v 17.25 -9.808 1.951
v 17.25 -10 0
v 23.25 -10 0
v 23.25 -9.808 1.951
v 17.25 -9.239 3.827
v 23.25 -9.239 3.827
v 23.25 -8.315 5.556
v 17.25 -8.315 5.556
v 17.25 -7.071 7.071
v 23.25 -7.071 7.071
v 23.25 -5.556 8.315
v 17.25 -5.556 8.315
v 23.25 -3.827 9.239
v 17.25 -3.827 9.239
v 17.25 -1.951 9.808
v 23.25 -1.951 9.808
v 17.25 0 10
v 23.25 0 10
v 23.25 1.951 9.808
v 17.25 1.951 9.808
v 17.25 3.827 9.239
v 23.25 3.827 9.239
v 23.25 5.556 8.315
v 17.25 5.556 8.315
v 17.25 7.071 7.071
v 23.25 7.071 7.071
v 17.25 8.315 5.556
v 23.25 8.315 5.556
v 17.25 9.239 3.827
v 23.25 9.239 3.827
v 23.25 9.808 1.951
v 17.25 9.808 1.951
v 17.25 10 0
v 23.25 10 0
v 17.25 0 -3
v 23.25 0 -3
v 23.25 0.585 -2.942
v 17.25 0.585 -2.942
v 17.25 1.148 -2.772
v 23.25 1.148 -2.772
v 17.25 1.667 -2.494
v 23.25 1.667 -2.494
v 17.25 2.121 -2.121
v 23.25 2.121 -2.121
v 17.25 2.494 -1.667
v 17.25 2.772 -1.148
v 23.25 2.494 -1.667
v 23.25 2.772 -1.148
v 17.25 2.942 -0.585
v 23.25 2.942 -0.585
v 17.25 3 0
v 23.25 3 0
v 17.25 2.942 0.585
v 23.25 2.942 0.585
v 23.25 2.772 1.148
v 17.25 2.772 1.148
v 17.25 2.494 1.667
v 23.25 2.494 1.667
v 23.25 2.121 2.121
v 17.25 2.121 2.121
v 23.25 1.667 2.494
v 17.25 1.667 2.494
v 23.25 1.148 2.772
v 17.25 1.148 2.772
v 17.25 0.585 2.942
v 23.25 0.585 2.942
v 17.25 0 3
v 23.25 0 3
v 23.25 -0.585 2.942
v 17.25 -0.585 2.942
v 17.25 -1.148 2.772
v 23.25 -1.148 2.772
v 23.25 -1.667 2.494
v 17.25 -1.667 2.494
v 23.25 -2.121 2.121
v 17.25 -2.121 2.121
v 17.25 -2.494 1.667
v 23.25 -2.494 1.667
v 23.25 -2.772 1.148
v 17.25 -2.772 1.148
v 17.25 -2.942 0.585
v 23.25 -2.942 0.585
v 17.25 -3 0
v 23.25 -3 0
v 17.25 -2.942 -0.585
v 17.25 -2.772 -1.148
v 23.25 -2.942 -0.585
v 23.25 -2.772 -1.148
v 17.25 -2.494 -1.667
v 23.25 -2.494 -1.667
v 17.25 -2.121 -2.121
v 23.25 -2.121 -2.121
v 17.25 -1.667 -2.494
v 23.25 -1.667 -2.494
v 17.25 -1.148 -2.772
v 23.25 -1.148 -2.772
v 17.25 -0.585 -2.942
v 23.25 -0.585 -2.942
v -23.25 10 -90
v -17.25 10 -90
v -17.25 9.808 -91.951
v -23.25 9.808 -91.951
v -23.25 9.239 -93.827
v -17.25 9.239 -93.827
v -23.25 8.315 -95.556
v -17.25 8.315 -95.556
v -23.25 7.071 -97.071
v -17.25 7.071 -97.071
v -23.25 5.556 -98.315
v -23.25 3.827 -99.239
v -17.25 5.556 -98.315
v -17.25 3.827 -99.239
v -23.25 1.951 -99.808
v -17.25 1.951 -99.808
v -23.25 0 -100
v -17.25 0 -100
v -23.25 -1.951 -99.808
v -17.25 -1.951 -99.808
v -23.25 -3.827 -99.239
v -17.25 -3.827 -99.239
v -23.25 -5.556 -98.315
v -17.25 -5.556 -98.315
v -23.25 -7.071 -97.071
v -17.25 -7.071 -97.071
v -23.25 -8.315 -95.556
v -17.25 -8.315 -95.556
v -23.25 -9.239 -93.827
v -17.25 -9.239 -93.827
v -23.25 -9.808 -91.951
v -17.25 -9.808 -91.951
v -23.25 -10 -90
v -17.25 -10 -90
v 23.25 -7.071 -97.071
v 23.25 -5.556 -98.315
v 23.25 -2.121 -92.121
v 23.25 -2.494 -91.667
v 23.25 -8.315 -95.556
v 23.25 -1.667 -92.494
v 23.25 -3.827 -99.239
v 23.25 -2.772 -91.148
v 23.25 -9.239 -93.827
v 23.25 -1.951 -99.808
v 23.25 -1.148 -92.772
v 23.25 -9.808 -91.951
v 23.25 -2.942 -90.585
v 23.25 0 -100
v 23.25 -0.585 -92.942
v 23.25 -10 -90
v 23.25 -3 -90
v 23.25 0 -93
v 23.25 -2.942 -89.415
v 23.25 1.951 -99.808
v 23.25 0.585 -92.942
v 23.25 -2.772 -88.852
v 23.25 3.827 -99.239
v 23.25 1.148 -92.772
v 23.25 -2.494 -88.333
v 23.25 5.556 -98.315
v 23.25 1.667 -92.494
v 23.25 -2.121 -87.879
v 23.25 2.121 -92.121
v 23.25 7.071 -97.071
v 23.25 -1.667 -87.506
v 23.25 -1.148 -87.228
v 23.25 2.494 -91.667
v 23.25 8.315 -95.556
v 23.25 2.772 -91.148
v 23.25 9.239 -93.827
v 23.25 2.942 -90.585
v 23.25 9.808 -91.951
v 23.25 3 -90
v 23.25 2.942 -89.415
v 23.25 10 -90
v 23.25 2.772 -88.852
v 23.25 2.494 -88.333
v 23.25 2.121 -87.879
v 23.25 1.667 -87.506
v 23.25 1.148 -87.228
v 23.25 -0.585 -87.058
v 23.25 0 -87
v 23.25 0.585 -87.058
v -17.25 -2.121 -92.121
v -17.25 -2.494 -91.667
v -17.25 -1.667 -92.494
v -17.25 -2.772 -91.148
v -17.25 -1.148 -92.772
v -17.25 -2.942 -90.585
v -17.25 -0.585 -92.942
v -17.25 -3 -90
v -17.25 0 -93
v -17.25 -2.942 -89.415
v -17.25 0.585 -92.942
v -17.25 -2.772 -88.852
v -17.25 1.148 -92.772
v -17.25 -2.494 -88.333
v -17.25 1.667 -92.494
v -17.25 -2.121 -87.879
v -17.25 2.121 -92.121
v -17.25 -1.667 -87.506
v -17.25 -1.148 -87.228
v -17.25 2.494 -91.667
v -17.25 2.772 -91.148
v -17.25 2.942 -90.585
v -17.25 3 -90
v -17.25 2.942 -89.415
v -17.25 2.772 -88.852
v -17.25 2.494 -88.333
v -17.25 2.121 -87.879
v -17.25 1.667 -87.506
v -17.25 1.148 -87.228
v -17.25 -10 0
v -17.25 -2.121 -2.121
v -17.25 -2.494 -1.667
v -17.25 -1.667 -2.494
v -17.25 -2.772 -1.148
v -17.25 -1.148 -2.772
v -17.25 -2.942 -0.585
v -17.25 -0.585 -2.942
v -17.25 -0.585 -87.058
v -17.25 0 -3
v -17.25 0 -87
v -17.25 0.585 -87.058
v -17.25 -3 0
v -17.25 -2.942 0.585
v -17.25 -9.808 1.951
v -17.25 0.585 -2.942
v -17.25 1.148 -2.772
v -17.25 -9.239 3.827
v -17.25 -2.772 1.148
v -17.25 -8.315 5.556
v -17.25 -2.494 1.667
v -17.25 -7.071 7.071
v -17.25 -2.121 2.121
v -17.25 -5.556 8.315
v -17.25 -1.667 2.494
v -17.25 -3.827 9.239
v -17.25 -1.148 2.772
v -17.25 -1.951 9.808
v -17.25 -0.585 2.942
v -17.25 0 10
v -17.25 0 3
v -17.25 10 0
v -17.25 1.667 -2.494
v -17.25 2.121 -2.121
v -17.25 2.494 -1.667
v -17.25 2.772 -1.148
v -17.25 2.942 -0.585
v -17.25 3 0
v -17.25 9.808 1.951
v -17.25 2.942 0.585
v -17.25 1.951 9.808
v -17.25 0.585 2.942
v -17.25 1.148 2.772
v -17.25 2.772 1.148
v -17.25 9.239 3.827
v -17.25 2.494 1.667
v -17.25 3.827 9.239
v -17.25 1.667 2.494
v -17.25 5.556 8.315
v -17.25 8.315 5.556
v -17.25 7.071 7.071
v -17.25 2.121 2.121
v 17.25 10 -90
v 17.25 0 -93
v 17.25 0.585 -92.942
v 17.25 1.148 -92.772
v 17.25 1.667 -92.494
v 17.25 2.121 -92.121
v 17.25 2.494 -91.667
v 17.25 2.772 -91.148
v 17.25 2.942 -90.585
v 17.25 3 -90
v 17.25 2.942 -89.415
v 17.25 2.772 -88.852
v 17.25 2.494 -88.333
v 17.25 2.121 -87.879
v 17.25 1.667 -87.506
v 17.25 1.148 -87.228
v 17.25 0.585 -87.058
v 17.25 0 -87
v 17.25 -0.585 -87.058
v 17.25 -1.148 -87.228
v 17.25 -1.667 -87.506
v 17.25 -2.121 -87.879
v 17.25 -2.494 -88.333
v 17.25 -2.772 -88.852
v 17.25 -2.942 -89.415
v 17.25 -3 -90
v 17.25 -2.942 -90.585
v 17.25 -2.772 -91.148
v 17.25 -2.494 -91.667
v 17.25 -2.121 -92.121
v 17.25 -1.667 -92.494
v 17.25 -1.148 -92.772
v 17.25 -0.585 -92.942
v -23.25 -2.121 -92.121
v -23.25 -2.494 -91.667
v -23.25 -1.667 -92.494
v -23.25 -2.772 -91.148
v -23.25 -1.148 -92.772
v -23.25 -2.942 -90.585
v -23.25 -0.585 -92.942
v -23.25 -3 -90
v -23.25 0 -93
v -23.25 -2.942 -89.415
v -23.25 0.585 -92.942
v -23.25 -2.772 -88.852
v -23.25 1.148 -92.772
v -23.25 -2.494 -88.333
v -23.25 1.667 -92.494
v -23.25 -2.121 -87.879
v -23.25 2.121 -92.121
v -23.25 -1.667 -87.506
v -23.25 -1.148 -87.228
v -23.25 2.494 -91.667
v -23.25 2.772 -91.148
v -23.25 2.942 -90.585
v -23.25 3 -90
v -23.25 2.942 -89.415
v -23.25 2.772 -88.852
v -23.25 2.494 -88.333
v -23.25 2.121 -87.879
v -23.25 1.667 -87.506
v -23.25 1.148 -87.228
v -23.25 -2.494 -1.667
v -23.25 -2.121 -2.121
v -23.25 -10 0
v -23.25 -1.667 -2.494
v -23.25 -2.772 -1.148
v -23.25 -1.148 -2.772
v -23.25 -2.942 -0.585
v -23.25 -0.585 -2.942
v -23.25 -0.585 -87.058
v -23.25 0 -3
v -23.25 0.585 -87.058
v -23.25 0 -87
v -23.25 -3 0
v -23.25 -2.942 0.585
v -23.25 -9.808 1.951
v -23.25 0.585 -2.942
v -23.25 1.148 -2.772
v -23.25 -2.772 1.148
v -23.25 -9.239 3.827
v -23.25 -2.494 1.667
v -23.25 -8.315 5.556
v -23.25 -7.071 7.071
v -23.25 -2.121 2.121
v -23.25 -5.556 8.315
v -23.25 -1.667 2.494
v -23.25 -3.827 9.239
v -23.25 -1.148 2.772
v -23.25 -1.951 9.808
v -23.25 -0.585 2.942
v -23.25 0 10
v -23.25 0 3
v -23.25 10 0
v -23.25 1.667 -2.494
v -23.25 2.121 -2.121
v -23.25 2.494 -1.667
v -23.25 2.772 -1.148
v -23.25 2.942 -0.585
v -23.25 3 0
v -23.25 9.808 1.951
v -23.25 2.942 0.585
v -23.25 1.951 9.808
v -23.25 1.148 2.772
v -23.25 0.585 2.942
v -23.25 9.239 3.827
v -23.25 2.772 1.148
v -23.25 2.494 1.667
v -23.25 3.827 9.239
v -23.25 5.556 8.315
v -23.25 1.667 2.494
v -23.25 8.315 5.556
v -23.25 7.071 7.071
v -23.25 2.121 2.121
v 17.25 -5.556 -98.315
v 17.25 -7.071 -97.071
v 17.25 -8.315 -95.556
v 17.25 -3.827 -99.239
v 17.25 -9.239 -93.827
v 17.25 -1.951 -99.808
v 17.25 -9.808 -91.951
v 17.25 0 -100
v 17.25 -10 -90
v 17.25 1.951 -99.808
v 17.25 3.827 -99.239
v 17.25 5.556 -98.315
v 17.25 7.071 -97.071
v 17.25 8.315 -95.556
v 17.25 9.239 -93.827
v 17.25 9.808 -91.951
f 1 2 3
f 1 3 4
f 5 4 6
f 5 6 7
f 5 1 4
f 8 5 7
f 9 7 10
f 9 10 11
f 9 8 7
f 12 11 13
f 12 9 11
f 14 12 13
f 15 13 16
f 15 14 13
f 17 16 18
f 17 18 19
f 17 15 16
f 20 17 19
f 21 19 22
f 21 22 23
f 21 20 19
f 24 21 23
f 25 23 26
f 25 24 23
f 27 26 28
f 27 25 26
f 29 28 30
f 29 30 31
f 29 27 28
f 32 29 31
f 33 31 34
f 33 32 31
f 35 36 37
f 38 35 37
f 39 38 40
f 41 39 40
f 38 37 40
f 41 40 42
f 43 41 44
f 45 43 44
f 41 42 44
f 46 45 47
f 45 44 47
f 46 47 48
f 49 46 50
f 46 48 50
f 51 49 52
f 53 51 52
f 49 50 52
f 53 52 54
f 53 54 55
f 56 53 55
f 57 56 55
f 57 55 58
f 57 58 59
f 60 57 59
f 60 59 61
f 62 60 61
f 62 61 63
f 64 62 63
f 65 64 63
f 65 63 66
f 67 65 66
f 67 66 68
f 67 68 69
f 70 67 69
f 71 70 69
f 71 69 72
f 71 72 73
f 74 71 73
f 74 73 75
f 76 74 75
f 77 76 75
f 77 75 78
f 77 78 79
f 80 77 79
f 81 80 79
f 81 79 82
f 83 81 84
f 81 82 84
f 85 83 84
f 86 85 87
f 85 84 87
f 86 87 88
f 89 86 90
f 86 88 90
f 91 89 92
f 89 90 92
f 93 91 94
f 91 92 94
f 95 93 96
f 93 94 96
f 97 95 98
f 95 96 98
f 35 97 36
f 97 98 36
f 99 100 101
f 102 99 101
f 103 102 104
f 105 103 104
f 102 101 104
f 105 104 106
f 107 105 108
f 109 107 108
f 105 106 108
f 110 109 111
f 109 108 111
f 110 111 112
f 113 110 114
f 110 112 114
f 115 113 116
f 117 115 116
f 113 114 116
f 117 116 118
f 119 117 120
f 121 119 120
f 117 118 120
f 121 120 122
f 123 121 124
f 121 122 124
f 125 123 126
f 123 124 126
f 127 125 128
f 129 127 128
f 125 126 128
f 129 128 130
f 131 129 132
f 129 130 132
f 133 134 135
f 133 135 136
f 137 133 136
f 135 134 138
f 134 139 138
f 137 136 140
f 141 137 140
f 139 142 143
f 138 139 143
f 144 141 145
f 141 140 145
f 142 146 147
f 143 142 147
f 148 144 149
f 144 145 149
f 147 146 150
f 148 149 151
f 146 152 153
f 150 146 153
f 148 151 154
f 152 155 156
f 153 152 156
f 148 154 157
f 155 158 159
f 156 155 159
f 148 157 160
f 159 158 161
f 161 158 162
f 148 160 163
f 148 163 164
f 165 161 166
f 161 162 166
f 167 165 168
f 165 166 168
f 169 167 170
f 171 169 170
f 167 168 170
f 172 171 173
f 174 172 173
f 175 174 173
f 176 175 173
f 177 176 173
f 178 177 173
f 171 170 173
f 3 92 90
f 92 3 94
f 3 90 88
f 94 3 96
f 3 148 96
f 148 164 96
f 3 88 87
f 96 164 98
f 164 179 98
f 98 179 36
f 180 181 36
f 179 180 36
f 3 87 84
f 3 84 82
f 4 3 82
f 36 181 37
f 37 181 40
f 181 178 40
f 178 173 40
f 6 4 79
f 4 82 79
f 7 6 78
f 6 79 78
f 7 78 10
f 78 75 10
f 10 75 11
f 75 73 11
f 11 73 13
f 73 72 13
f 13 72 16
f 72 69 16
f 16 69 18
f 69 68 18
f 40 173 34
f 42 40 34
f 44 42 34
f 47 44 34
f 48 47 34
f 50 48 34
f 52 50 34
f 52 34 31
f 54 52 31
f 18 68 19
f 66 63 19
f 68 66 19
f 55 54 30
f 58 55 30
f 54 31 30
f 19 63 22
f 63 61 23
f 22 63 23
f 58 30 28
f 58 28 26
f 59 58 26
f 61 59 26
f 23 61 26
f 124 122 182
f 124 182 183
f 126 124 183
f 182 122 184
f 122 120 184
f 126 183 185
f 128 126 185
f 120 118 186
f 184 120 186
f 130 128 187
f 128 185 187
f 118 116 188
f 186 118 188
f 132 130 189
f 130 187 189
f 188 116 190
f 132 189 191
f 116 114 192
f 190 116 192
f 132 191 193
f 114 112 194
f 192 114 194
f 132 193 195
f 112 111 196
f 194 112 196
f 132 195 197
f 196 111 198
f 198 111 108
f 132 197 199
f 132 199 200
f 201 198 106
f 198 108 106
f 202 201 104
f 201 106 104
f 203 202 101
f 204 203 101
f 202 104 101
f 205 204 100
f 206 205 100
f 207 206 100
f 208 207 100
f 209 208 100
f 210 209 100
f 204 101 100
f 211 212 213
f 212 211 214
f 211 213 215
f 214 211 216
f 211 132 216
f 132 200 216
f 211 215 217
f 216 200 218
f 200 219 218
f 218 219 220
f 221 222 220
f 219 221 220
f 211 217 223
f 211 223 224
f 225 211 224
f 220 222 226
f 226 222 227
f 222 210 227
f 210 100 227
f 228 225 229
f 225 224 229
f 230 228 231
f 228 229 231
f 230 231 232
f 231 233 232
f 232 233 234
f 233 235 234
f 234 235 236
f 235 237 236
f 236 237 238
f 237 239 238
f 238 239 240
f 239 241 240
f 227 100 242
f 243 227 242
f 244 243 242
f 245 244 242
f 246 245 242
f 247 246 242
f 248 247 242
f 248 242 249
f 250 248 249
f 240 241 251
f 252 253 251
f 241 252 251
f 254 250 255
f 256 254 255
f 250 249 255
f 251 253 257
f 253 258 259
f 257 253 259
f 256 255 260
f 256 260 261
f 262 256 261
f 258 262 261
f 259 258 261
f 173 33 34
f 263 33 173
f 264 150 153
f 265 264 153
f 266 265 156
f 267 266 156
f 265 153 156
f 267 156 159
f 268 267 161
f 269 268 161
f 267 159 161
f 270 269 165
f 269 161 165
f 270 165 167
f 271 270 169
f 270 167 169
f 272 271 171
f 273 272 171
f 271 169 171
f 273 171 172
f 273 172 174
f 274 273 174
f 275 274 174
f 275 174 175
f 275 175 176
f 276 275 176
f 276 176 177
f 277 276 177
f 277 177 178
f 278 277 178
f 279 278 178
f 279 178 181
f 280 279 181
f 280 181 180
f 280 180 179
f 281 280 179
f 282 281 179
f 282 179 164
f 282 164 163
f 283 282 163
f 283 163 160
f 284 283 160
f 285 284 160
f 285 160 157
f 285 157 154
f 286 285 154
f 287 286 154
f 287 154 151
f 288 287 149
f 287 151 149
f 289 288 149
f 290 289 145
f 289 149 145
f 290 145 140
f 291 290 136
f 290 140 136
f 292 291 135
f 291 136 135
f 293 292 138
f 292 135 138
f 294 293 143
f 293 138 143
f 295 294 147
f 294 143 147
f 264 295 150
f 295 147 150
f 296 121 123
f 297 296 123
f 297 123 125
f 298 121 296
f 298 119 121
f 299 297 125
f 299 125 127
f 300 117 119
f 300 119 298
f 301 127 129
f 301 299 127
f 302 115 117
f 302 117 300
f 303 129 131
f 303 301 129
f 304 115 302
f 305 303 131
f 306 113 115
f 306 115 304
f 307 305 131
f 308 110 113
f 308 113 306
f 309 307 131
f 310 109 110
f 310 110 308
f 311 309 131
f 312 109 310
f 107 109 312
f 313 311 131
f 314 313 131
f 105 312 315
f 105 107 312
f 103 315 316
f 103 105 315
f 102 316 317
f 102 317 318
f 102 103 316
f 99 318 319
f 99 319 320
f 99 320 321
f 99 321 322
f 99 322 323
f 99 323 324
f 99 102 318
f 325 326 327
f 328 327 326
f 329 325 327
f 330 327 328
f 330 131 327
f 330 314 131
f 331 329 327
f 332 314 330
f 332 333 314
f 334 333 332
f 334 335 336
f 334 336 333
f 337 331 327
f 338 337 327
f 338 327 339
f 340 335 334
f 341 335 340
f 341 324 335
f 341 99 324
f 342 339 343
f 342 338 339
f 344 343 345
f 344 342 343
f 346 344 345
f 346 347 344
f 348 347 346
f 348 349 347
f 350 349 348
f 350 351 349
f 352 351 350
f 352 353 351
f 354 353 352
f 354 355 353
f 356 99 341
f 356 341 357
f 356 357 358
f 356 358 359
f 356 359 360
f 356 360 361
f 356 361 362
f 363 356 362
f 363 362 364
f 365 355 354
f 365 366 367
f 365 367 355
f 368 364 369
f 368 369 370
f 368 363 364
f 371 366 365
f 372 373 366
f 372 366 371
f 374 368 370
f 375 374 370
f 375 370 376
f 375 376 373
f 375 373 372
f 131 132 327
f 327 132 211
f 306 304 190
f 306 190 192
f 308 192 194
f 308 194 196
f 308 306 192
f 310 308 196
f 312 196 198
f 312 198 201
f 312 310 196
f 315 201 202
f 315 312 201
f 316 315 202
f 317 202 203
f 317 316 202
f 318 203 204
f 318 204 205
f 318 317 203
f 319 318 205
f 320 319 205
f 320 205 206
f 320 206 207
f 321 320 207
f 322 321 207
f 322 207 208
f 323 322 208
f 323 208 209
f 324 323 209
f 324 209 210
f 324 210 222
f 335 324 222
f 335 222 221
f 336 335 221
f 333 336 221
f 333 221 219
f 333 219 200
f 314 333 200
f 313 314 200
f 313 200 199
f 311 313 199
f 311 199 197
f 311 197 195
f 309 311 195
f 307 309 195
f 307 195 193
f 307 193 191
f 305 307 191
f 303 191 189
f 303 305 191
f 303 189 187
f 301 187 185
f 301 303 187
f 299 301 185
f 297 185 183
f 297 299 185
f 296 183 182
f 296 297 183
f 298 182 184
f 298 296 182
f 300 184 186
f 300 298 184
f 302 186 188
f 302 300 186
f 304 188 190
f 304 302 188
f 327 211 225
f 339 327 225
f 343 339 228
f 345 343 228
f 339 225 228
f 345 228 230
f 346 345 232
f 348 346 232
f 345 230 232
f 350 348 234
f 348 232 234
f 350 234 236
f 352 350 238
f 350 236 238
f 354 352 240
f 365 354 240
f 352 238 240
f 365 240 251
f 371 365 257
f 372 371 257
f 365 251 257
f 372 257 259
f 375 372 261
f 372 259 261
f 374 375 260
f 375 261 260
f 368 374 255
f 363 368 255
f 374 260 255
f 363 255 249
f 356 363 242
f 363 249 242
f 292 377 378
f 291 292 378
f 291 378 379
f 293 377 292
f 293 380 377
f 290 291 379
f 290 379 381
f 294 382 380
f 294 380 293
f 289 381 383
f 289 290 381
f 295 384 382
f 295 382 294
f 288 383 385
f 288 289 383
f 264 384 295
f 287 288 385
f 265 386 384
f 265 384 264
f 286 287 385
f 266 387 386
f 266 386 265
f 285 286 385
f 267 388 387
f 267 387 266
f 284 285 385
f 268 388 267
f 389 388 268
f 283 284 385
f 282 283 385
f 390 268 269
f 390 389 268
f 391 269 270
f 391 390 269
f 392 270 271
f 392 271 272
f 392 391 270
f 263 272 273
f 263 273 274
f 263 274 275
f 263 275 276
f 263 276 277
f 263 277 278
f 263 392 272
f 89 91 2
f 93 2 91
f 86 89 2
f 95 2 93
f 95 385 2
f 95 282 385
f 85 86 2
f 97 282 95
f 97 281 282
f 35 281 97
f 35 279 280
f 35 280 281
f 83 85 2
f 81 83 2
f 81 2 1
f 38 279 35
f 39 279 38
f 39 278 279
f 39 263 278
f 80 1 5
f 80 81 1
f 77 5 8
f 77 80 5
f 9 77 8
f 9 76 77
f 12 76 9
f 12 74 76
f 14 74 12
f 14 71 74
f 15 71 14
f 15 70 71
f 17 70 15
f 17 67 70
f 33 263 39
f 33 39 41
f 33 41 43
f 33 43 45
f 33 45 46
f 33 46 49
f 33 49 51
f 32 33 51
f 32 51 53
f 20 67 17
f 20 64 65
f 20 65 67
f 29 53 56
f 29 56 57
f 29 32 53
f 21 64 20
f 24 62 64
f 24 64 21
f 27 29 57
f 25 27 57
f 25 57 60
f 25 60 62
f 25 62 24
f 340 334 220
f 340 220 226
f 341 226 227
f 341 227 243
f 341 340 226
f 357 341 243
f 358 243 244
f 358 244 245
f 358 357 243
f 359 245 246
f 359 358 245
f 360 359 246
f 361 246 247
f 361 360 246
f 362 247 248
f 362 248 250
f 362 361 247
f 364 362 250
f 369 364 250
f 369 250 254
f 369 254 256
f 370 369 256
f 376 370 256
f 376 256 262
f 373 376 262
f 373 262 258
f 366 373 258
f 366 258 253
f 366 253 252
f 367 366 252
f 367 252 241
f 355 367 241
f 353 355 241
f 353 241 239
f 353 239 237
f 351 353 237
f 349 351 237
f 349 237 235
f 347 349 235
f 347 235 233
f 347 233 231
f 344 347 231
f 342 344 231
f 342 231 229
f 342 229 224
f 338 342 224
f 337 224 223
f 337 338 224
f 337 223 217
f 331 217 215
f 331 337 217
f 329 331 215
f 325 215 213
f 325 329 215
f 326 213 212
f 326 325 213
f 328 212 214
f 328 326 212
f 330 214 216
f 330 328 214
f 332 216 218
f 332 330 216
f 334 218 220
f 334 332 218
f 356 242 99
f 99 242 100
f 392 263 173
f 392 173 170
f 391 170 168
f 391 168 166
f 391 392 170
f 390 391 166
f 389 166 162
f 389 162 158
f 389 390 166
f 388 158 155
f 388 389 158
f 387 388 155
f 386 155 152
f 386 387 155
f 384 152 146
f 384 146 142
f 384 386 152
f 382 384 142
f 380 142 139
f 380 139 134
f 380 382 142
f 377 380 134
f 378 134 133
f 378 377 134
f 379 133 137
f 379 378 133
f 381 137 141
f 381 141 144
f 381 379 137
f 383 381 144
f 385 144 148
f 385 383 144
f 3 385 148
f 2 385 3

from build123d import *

# Parameters (mm, degrees)
BOSS_EXTRUDE1_DEPTH     = 6
SKETCH2_R               = 3
CUT_EXTRUDE1_DEPTH      = 1
CUT_EXTRUDE1_DEPTH_BACK = 7


with BuildPart() as part:
    # Sketch1 → Boss-Extrude1 (new body)
    with BuildSketch(Plane(origin=(17.25, 0, 0), x_dir=(0, 0, -1), z_dir=(1, 0, 0))):
        with BuildLine():
            Line((0, 10), (90, 10))
            ThreePointArc((90, 10), (100, 0), (90, -10))
            Line((90, -10), (0, -10))
            ThreePointArc((0, -10), (-10, 0), (0, 10))
        make_face()
    extrude(amount=BOSS_EXTRUDE1_DEPTH)

    # Sketch2 → Cut-Extrude1 (cut, two sides)
    with BuildSketch(Plane(origin=(23.25, 0, 0), x_dir=(0, 0, -1), z_dir=(1, 0, 0))) as cut_extrude1_sk:
        Circle(SKETCH2_R)
        with Locations((90, 0)):
            Circle(SKETCH2_R)
    extrude(amount=CUT_EXTRUDE1_DEPTH, mode=Mode.SUBTRACT)
    extrude(cut_extrude1_sk.sketch, amount=-CUT_EXTRUDE1_DEPTH_BACK, mode=Mode.SUBTRACT)


with BuildPart() as body_2:
    # Mirror4: mirrored copy
    add(part.part.mirror(Plane(origin=(0, 0, 0), x_dir=(0, 0, 1), z_dir=(1, 0, 0))))


solid = Compound([part.part, body_2.part])
